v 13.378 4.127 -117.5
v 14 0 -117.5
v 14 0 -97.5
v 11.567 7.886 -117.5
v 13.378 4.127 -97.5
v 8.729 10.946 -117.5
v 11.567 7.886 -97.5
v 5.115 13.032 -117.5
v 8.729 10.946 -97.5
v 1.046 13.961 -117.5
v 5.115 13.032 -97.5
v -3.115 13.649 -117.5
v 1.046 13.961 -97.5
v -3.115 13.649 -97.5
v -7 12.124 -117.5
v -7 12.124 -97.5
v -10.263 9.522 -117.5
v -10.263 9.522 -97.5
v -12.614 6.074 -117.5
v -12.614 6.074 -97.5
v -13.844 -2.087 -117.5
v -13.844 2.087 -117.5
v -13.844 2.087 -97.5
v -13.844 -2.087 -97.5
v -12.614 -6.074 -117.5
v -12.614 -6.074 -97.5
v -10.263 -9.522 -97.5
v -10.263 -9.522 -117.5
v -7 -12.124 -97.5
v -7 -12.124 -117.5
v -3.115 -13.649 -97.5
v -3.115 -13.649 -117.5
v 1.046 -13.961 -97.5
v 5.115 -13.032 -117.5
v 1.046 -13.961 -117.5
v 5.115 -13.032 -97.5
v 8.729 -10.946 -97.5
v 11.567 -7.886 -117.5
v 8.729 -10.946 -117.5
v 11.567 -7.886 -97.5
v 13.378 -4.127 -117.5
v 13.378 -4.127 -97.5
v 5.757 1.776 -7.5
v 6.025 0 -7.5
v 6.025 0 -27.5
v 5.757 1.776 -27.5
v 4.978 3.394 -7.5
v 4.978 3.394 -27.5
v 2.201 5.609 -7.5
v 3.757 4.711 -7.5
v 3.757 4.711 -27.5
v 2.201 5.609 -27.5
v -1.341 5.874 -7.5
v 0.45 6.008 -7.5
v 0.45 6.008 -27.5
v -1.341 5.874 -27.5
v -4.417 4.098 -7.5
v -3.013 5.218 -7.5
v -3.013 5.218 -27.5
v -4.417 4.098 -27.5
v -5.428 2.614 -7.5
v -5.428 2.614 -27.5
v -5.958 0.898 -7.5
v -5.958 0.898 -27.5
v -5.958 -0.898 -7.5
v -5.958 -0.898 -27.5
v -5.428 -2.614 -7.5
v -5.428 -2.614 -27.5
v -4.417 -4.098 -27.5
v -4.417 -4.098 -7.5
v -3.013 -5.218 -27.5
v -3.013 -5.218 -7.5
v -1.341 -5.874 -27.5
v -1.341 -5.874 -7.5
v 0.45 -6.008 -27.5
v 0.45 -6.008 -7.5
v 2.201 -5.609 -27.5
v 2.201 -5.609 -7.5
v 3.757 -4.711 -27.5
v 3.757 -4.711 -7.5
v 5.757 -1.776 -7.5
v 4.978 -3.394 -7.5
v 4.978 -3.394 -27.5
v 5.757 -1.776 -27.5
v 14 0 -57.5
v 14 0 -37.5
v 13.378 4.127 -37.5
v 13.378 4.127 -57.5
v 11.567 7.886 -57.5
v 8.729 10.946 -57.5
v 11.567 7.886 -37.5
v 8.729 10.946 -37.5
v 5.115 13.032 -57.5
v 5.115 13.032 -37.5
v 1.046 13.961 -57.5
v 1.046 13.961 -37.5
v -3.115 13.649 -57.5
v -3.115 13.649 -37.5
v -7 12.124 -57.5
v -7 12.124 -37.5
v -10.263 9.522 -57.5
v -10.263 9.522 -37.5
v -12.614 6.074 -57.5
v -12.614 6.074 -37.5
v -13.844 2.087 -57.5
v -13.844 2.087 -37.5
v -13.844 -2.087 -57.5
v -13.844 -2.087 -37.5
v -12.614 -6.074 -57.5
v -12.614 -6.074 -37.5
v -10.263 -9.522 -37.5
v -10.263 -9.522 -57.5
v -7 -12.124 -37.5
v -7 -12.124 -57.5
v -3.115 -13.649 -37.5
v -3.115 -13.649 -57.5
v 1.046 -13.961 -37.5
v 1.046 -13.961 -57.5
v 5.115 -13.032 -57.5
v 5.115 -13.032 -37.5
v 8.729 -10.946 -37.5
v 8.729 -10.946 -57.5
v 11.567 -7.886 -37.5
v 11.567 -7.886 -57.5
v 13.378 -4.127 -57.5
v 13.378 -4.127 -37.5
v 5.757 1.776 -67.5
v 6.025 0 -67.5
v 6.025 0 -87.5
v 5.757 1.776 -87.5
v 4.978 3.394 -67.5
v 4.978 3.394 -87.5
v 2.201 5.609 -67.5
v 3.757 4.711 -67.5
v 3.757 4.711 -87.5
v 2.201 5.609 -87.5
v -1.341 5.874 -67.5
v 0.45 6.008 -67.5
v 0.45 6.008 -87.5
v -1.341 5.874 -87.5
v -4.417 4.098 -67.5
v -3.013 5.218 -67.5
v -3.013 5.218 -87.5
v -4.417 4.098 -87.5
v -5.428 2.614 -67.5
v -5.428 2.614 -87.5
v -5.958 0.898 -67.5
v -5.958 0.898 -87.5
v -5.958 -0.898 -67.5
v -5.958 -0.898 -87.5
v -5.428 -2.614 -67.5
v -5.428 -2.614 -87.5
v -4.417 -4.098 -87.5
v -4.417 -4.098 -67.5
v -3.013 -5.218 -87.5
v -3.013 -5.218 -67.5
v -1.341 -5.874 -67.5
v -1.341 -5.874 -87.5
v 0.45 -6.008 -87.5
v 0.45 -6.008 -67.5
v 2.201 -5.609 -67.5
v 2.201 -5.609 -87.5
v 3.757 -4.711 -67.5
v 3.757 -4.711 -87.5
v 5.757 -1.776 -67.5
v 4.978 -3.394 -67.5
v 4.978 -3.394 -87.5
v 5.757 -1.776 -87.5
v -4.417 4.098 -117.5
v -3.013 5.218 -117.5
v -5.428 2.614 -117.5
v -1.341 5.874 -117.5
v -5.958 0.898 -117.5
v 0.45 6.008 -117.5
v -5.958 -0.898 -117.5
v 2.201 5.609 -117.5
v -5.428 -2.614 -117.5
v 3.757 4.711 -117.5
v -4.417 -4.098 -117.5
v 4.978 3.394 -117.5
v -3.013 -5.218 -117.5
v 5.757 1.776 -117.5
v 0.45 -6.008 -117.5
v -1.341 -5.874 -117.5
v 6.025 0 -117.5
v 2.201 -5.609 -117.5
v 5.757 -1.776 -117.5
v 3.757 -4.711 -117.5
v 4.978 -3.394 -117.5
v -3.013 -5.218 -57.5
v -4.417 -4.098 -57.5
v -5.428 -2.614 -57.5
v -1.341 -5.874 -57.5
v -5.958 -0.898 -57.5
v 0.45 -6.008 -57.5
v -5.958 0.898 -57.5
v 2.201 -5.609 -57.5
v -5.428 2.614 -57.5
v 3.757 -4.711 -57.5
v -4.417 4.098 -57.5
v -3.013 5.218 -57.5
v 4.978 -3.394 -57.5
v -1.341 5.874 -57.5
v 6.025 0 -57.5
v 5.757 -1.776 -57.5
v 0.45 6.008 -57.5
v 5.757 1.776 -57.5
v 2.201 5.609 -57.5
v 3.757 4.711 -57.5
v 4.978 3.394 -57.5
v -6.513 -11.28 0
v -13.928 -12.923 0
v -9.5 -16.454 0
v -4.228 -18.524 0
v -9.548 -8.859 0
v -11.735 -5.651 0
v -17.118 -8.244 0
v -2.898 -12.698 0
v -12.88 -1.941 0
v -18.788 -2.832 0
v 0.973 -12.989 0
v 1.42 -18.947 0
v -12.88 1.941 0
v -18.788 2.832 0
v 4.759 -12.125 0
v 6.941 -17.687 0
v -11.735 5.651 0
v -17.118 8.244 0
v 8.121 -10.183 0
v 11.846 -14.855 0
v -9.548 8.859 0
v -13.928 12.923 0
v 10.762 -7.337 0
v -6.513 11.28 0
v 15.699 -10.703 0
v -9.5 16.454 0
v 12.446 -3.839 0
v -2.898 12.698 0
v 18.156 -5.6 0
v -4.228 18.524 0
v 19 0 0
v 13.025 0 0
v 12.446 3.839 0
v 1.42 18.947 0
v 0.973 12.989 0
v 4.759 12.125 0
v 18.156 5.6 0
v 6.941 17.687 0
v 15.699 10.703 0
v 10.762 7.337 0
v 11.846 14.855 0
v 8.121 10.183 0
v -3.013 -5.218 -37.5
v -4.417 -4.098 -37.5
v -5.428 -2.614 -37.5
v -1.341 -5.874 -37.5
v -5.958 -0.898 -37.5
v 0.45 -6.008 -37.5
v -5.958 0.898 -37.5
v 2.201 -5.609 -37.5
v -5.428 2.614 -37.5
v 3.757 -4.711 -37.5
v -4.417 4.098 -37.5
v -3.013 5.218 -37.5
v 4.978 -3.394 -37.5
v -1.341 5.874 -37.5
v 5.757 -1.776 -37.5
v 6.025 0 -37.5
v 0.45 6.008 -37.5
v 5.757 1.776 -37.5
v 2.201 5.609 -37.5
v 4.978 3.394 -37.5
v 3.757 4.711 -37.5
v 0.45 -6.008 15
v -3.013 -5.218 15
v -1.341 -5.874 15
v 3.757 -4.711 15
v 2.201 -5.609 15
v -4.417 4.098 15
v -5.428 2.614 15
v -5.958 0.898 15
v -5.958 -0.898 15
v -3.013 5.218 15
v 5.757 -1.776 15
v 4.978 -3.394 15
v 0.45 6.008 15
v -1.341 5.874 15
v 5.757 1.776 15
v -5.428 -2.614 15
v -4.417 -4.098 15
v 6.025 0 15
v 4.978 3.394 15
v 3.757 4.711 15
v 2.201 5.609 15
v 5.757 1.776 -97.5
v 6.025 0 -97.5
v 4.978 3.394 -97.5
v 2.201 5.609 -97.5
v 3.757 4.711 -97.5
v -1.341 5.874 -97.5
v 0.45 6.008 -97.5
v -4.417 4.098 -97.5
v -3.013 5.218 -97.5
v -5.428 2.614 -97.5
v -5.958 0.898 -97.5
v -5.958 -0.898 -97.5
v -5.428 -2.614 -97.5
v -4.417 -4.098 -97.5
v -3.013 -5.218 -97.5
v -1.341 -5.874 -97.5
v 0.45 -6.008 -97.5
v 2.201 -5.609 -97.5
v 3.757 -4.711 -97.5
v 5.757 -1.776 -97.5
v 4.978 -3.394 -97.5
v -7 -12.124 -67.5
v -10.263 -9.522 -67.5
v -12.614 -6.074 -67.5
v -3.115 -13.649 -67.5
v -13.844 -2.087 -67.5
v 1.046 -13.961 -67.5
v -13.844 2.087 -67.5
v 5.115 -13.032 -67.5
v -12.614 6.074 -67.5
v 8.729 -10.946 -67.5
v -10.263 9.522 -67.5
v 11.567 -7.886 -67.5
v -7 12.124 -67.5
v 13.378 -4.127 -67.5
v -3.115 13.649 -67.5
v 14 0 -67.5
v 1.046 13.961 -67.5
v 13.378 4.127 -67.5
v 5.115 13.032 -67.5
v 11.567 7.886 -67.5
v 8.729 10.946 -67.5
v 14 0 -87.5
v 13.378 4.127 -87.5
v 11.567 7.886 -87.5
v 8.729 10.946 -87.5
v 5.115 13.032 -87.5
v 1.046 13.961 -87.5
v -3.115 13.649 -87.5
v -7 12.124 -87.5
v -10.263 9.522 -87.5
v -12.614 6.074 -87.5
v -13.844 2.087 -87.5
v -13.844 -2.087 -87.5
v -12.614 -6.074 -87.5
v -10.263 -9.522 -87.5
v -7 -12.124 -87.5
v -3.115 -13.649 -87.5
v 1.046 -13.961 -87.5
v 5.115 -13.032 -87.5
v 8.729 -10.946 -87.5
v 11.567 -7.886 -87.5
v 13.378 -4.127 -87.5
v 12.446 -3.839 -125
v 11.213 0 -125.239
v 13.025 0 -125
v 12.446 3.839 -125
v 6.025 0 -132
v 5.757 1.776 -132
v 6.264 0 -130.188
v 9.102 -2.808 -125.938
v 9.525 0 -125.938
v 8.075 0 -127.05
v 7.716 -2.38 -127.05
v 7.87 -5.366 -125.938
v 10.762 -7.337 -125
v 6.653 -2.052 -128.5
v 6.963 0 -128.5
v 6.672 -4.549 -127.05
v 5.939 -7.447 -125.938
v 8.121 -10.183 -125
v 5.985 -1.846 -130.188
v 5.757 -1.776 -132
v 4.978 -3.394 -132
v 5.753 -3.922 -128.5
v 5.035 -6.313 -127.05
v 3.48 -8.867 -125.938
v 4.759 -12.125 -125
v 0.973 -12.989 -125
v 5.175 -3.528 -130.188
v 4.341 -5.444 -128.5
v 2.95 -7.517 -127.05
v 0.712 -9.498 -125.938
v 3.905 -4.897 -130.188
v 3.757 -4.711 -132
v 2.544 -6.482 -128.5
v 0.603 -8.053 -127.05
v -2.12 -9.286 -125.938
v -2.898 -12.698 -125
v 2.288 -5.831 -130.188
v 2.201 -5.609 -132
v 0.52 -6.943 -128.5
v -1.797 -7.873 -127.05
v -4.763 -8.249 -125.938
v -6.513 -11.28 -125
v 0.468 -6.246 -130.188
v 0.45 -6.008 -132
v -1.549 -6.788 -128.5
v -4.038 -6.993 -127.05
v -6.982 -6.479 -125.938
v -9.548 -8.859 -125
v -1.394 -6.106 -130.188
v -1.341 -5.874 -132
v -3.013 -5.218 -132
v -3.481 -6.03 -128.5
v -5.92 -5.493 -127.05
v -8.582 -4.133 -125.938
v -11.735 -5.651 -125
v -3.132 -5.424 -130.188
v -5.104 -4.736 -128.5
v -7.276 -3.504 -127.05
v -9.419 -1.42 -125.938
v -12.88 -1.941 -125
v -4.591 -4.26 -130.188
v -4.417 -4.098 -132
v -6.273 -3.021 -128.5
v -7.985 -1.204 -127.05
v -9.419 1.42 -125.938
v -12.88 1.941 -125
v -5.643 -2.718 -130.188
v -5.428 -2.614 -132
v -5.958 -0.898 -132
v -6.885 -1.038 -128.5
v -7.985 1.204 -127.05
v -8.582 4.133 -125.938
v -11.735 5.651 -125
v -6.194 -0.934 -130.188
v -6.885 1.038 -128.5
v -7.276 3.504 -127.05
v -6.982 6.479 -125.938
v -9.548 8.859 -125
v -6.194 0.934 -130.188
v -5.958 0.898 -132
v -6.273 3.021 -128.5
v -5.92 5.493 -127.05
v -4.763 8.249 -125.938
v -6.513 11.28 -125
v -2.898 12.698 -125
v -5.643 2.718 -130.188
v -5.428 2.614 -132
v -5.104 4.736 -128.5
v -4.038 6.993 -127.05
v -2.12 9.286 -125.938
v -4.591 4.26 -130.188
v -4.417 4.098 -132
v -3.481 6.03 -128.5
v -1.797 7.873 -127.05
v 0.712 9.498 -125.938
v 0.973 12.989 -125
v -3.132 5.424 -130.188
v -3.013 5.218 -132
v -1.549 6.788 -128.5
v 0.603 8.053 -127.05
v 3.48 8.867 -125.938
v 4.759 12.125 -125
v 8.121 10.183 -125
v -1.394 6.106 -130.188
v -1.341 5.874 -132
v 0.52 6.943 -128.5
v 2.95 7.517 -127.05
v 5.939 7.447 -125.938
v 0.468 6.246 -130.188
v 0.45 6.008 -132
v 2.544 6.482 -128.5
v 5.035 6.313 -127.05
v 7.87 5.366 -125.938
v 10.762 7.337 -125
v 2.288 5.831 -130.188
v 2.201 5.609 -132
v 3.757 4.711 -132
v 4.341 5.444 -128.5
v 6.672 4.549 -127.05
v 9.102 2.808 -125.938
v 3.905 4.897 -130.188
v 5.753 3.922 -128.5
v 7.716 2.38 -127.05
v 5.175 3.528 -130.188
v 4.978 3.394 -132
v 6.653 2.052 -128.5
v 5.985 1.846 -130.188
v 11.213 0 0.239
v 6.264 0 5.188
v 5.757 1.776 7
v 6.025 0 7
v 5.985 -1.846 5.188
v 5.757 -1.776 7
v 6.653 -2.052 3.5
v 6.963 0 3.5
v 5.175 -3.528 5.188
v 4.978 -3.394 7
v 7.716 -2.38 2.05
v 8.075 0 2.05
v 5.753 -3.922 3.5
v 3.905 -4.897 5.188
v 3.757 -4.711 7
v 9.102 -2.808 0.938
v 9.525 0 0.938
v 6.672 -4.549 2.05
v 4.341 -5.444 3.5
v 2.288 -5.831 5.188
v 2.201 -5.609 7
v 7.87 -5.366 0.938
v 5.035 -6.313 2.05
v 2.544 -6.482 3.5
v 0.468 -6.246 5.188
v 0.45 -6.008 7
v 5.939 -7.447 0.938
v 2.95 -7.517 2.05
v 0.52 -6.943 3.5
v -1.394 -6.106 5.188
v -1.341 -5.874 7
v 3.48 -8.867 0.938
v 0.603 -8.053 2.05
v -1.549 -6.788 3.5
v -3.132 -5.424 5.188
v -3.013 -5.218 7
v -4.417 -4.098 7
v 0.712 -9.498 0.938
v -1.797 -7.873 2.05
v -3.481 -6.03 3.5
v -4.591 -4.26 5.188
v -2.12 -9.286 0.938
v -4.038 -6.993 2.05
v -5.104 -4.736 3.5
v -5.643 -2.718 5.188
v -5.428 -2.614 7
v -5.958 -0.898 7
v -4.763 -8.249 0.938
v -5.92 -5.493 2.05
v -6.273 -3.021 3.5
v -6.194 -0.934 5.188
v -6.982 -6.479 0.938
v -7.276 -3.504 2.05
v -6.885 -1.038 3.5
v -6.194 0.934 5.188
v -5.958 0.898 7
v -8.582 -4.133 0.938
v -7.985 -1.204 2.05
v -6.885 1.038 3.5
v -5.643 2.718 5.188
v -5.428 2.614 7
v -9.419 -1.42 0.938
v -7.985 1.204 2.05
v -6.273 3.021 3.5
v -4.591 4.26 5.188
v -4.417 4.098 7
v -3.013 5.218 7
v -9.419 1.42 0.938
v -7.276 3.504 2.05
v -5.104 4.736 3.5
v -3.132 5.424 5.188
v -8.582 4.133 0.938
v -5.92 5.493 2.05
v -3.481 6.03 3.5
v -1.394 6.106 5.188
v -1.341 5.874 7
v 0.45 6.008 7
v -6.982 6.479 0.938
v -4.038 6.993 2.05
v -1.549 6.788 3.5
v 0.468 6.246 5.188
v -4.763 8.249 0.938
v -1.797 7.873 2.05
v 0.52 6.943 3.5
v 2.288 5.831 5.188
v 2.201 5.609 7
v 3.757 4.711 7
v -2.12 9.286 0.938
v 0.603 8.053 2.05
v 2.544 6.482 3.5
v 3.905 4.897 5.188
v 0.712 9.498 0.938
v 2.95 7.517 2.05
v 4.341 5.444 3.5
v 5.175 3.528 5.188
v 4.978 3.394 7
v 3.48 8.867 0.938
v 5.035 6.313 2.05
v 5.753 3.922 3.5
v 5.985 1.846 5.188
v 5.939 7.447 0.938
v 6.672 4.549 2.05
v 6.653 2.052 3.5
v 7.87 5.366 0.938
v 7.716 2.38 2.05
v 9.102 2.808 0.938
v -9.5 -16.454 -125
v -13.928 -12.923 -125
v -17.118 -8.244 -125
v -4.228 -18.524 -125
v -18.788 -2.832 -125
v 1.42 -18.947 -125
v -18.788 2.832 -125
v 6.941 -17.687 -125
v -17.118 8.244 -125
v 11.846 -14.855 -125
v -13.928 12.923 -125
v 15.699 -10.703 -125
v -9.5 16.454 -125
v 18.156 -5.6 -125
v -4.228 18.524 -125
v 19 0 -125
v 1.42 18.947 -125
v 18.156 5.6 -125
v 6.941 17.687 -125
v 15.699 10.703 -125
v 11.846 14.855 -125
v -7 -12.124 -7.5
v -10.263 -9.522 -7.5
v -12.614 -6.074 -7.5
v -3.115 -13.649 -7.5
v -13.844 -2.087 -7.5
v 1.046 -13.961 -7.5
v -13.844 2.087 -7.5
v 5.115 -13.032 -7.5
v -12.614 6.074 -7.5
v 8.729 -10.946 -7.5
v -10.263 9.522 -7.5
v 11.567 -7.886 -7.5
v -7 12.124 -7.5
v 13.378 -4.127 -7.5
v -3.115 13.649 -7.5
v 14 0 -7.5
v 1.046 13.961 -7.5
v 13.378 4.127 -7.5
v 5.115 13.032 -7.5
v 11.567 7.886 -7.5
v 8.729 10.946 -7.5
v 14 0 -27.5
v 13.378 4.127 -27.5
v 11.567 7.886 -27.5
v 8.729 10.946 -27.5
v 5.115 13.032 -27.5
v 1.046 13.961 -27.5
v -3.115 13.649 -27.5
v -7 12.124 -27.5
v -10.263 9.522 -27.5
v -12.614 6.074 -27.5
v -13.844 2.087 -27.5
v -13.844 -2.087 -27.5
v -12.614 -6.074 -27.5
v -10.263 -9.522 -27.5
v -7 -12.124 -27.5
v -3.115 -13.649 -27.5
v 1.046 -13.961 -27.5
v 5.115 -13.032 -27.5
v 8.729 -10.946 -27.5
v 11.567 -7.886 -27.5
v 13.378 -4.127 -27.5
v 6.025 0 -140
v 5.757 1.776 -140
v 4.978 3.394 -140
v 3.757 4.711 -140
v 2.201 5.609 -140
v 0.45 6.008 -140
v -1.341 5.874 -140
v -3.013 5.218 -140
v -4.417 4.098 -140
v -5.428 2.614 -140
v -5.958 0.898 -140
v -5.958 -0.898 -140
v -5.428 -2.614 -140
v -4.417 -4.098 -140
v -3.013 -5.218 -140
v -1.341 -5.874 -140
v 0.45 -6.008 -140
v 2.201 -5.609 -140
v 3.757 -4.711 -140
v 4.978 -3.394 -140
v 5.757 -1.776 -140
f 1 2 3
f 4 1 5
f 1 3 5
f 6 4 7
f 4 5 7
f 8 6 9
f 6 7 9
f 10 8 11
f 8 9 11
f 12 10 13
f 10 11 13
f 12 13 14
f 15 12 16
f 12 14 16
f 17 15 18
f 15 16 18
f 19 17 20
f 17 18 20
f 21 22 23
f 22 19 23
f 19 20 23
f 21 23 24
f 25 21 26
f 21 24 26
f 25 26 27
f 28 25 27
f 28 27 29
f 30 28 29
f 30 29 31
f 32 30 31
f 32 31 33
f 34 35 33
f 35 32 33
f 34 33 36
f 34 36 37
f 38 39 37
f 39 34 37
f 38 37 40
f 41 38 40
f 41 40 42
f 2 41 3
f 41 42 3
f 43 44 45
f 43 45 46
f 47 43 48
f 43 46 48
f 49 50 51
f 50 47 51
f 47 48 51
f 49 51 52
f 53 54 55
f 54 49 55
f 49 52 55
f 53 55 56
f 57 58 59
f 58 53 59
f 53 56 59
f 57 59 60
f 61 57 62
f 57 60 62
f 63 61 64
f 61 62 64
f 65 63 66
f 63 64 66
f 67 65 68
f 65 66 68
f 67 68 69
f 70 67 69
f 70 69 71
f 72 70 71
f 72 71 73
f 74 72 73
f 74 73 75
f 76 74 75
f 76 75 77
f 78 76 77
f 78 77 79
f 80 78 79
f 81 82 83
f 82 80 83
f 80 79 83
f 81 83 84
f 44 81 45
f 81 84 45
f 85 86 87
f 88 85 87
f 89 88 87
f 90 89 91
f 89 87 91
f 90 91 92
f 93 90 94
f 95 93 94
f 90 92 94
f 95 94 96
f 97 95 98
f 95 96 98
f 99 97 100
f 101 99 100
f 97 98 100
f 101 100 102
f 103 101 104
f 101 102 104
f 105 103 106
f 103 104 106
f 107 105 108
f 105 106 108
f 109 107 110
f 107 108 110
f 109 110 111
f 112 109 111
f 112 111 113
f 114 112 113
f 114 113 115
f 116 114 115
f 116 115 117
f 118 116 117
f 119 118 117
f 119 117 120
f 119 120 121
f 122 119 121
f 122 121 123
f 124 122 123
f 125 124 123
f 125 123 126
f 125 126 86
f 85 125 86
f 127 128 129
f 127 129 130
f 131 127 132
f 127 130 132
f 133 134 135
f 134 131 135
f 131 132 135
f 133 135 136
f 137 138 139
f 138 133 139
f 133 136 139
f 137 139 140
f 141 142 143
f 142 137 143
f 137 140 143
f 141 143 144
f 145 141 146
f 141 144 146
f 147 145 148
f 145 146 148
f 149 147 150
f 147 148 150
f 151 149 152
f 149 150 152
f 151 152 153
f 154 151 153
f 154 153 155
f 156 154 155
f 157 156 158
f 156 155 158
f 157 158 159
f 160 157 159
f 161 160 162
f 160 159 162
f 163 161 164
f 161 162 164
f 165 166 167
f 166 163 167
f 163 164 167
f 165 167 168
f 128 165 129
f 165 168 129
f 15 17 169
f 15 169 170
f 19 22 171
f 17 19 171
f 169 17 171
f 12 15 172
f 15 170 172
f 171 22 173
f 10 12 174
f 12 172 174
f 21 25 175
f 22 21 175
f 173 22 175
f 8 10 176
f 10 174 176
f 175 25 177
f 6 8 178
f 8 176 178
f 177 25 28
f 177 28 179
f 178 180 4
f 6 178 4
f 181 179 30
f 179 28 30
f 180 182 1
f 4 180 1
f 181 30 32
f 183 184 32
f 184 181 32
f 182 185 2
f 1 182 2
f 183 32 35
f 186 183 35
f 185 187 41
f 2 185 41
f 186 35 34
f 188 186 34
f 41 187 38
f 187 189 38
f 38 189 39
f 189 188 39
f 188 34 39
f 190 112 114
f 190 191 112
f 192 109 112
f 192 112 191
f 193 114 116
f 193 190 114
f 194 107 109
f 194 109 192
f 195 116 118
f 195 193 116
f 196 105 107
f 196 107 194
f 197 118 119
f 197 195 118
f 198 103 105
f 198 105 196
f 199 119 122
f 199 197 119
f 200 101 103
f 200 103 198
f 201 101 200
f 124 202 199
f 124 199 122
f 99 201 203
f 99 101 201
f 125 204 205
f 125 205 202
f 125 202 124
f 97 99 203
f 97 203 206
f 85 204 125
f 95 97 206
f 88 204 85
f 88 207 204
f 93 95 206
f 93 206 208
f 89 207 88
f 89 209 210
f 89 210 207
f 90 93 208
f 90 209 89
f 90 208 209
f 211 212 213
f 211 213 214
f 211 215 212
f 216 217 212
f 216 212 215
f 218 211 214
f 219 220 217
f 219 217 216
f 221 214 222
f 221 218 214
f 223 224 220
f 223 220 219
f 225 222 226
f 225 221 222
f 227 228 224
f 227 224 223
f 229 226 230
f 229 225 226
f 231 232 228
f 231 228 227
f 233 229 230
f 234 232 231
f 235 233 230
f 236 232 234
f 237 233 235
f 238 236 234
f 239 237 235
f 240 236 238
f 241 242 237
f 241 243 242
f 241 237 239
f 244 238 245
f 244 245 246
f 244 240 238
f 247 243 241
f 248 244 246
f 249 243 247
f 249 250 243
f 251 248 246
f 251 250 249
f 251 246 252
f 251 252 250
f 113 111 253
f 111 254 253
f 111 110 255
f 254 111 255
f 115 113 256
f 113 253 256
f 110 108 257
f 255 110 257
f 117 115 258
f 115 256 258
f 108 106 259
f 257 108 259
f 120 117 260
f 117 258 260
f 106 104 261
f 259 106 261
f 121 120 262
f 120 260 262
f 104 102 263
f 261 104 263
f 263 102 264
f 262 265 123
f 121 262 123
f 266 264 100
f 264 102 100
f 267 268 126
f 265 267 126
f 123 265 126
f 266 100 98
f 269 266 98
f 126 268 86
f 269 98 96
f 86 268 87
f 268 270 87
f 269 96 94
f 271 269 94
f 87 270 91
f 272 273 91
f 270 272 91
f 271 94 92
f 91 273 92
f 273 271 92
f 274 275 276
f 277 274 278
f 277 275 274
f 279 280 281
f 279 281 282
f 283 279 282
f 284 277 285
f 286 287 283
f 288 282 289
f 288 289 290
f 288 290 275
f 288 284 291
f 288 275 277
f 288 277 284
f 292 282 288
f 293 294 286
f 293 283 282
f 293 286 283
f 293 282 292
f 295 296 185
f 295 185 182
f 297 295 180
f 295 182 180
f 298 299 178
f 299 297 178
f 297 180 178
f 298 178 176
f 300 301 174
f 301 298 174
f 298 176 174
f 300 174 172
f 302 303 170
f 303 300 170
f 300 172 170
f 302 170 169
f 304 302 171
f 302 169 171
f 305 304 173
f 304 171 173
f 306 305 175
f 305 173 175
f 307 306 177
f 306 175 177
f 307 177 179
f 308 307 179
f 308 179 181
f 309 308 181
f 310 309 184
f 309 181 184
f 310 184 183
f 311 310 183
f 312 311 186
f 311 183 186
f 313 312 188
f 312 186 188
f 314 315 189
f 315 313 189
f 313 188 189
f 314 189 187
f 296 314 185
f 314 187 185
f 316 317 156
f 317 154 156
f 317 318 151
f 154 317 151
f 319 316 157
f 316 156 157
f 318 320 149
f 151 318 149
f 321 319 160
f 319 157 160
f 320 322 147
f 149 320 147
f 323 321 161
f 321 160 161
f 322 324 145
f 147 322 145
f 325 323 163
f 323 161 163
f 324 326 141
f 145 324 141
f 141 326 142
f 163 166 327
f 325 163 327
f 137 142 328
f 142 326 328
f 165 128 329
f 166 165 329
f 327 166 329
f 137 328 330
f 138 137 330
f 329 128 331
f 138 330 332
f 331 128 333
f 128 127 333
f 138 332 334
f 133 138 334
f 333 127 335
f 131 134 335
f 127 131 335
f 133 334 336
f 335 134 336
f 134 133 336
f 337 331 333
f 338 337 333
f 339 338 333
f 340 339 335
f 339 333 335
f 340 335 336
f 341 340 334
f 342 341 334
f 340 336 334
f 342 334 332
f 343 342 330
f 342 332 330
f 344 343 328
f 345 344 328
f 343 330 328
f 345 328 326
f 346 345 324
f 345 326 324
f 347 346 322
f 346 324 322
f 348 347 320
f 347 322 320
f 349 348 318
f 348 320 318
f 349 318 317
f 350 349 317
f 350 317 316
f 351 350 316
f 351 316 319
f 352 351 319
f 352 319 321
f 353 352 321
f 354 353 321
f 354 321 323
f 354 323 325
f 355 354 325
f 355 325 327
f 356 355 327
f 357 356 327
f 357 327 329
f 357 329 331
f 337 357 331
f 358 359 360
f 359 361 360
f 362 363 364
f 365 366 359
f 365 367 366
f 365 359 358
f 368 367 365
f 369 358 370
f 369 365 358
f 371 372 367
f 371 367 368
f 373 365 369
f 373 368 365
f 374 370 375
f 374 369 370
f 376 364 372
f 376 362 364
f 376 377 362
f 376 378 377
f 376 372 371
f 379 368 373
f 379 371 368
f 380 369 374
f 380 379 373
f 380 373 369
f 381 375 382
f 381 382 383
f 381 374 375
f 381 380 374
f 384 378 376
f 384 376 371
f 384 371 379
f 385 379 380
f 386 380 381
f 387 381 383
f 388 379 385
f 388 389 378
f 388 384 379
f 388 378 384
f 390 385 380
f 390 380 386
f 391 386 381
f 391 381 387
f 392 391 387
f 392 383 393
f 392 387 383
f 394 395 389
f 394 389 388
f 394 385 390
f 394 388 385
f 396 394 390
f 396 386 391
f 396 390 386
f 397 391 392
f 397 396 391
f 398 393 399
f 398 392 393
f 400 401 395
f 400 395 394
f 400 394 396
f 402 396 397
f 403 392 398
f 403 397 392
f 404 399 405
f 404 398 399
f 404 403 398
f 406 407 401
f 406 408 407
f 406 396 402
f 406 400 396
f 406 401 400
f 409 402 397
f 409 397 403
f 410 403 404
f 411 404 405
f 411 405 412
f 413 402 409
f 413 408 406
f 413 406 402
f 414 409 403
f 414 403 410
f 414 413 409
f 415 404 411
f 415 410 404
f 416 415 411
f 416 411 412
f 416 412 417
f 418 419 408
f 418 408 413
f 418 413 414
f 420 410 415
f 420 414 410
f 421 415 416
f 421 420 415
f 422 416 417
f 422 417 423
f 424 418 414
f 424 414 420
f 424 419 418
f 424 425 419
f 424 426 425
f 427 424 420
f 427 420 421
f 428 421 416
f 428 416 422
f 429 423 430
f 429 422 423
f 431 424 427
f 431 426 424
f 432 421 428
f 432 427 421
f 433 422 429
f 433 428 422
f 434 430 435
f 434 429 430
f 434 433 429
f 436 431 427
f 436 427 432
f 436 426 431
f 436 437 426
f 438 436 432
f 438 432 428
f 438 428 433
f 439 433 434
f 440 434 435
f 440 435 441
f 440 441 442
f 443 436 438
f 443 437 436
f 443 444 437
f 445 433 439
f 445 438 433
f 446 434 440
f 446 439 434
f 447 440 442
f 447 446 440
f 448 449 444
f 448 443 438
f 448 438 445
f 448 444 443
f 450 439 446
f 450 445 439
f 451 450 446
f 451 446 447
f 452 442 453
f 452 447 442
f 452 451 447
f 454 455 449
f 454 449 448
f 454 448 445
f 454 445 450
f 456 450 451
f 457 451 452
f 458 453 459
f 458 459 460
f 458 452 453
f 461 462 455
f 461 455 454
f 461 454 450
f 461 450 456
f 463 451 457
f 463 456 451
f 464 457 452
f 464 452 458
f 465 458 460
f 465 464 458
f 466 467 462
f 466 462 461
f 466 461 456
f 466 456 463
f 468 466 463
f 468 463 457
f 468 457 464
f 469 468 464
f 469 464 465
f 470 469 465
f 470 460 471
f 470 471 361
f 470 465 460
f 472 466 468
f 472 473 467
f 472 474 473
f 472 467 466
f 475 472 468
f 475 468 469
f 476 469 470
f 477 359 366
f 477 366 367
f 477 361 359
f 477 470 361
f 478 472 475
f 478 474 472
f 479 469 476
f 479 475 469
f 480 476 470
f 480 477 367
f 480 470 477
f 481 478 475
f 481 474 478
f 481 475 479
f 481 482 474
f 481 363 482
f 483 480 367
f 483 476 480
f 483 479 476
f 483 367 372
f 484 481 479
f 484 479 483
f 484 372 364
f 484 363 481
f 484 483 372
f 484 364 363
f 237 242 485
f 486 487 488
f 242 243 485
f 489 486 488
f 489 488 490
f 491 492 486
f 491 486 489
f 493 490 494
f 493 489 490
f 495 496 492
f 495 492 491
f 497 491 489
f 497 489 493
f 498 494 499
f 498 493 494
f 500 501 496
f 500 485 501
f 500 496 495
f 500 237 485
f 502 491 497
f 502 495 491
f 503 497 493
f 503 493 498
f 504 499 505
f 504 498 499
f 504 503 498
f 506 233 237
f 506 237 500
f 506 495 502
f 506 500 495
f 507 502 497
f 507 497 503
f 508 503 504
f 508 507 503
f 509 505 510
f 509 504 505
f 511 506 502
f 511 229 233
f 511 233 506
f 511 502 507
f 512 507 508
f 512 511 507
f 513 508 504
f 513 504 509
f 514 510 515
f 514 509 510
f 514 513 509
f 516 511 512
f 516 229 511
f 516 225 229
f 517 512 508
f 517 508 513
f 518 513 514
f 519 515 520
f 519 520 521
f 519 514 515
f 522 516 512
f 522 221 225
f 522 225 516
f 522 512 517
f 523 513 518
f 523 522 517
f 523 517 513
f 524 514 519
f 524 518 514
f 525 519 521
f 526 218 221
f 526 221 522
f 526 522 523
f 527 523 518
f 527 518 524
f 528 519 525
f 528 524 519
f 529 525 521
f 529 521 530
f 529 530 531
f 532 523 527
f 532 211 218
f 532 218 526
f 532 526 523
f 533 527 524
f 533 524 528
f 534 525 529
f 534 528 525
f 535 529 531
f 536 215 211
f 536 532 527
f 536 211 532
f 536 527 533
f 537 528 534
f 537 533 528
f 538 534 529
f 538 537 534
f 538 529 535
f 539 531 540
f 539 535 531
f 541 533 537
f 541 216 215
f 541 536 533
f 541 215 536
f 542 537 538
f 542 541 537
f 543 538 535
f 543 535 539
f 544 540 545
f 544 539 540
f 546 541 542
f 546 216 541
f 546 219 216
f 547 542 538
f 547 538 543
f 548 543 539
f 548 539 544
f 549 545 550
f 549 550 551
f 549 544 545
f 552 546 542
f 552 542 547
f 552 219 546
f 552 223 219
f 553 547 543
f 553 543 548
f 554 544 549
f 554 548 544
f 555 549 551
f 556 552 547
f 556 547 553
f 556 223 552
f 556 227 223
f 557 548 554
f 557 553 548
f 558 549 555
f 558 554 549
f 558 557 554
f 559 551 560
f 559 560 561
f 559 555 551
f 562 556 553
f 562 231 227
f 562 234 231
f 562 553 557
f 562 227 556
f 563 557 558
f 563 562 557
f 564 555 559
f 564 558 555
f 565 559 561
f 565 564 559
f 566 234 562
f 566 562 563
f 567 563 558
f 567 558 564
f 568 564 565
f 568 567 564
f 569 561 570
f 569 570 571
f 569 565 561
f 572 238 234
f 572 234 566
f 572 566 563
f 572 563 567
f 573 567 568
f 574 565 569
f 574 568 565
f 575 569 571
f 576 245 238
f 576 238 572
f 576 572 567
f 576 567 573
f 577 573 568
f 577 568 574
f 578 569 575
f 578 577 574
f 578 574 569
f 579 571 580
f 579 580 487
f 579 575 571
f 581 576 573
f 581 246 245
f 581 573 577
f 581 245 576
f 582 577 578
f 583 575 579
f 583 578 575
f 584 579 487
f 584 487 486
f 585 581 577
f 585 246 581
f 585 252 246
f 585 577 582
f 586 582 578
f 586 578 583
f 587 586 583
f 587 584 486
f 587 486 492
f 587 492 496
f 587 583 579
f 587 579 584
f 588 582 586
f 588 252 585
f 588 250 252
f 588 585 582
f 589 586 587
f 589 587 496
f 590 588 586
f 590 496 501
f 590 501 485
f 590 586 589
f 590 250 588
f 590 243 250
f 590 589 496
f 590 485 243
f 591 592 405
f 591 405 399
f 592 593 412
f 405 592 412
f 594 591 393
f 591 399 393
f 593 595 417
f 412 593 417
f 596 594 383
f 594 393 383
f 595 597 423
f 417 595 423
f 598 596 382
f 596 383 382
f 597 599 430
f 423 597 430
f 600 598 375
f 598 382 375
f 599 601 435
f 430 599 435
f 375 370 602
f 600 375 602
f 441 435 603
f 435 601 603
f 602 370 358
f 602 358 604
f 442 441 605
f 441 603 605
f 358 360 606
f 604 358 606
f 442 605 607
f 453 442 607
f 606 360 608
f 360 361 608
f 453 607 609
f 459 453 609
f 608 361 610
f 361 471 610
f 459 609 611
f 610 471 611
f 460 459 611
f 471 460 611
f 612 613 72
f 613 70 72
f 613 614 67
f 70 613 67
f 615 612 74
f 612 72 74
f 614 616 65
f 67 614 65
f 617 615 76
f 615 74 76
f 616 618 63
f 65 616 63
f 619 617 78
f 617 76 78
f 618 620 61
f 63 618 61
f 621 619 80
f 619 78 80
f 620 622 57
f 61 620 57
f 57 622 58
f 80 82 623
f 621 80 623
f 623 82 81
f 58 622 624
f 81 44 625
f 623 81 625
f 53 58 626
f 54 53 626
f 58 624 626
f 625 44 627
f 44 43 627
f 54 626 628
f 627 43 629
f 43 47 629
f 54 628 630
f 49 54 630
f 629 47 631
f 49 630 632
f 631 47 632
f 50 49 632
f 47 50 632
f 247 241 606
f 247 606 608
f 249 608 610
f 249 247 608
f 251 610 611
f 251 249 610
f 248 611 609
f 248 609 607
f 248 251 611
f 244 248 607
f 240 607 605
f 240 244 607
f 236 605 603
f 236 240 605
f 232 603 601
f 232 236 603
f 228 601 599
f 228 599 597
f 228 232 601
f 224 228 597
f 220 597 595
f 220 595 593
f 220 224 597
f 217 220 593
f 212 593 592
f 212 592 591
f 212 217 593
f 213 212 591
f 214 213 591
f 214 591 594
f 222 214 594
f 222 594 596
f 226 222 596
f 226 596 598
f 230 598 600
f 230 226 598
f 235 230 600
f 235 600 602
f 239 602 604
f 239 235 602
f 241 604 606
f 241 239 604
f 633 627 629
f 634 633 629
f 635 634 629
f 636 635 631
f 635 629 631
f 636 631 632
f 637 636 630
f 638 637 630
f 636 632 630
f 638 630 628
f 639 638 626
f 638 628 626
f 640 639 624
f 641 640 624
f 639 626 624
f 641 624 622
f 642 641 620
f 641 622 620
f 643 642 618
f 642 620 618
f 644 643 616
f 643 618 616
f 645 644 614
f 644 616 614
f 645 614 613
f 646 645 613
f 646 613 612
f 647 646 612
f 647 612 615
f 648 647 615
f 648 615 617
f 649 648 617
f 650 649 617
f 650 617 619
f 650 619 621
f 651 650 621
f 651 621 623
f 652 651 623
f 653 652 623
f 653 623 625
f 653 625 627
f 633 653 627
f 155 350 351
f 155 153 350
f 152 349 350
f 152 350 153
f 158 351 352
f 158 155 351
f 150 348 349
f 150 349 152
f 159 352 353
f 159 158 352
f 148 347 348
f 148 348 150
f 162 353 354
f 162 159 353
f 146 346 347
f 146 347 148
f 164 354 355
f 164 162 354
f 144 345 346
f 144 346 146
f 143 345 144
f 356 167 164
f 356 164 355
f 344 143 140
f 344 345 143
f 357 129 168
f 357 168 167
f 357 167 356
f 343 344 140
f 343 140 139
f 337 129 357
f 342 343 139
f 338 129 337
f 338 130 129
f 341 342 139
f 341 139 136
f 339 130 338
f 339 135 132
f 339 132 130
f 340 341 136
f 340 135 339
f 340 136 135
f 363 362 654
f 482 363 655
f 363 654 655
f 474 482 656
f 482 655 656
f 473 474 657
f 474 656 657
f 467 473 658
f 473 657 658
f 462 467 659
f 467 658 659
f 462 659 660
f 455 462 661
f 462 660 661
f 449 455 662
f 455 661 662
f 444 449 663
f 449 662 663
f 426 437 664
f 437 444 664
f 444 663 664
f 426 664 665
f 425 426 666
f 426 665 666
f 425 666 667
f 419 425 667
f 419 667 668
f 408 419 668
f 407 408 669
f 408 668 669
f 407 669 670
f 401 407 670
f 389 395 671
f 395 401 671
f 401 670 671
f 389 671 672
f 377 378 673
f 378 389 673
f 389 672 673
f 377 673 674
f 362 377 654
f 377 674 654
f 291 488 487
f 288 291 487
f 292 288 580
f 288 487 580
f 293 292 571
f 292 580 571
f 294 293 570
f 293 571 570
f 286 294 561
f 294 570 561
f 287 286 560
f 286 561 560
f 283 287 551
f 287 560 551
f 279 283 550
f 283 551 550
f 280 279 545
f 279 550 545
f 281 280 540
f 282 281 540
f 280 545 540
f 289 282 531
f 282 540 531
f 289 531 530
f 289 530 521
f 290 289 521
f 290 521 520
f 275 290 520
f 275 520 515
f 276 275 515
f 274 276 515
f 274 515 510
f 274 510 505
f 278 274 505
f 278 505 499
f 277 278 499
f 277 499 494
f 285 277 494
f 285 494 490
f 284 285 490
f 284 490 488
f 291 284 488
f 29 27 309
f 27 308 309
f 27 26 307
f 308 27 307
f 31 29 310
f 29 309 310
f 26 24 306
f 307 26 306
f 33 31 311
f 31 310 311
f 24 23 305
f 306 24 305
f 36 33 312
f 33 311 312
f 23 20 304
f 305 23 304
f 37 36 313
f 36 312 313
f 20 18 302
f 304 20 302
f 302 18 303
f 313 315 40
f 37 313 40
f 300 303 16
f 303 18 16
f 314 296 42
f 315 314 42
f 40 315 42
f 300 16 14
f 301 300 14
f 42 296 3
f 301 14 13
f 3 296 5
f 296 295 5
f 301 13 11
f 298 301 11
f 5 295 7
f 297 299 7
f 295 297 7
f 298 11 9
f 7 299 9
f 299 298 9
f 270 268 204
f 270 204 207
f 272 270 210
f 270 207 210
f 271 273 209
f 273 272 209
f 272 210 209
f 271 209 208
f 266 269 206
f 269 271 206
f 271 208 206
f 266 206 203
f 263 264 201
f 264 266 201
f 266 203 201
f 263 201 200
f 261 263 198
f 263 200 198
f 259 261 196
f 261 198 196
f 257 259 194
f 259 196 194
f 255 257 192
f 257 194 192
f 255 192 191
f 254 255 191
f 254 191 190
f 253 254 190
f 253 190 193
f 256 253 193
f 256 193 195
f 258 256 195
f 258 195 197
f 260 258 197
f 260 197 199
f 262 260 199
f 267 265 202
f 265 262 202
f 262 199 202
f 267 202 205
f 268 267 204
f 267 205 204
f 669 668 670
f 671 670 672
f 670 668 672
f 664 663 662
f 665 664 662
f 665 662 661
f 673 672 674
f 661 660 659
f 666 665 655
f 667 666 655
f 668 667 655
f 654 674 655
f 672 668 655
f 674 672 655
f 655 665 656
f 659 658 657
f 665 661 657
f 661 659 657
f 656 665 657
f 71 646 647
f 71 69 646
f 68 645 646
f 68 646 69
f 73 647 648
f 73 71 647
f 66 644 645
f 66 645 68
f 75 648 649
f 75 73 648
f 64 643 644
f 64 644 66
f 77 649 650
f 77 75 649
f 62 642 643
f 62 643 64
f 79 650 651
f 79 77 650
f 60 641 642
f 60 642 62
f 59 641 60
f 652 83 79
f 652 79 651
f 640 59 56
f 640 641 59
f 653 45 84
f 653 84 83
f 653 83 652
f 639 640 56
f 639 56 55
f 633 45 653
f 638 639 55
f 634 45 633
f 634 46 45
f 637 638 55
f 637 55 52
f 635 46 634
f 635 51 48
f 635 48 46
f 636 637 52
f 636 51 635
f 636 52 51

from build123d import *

# Parameters (mm, degrees)
SKETCH1_R                 = 19
SKETCH1_R_2               = 14
BOSS_EXTRUDE1_DEPTH       = 125
BOSS_EXTRUDE2_START       = 7.5
SKETCH2_R                 = 14
BOSS_EXTRUDE2_DEPTH       = 7.5
CUT_EXTRUDE1_DEPTH        = 121.53319045
CUT_EXTRUDE1_DEPTH_BACK   = 121.53319045
SKETCH4_R                 = 6.025
SKETCH5_R                 = 14
BOSS_EXTRUDE3_DEPTH       = 7.5
BOSS_EXTRUDE4_DEPTH       = 15
BOSS_EXTRUDE4_DEPTH_BACK  = 140
SKETCH7_R                 = 6.025
SKETCH8_R                 = 15
BOSS_EXTRUDE5_DEPTH       = 5
LPATTERN2_COUNT           = 2
LPATTERN2_PITCH           = 30
LPATTERN3_COPY_1_SKETCH_R = 15
LPATTERN3_COPY_1_DEPTH    = 5
LPATTERN3_COPY_2_SKETCH_R = 15
LPATTERN3_COPY_2_DEPTH    = 5
FILLET1_R                 = 7


with BuildPart() as part:
    # Sketch1 → Boss-Extrude1 (new body)
    with BuildSketch(Plane.XY):
        Circle(SKETCH1_R)
        Circle(SKETCH1_R_2, mode=Mode.SUBTRACT)
    extrude(amount=-BOSS_EXTRUDE1_DEPTH)

    # Sketch2 → Boss-Extrude2 (add)
    with BuildSketch(Plane.XY.offset(-7.5).offset(BOSS_EXTRUDE2_START)):
        Circle(SKETCH2_R)
    extrude(amount=-BOSS_EXTRUDE2_DEPTH)

    # Sketch4 → Cut-Extrude1 (cut, two sides: drawn at the far end of the back side and taken through both)
    with BuildSketch(Plane.XY.offset(-7.5).offset(-CUT_EXTRUDE1_DEPTH_BACK)):
        Circle(SKETCH4_R)
    extrude(amount=CUT_EXTRUDE1_DEPTH + CUT_EXTRUDE1_DEPTH_BACK, mode=Mode.SUBTRACT)

    # Sketch5 → Boss-Extrude3 (add)
    with BuildSketch(Plane(origin=(0, 0, -117.5), x_dir=(-1, 0, 0), z_dir=(0, 0, -1))):
        with Locations(Location((0, 0, 0), (0, 0, 180))):
            Circle(SKETCH5_R)
    extrude(amount=BOSS_EXTRUDE3_DEPTH)

    # Sketch7 → Boss-Extrude4 (add, two sides: drawn at the far end of the back side and taken through both)
    with BuildSketch(Plane.XY.offset(-BOSS_EXTRUDE4_DEPTH_BACK)):
        Circle(SKETCH7_R)
    extrude(amount=BOSS_EXTRUDE4_DEPTH + BOSS_EXTRUDE4_DEPTH_BACK)

    # Sketch8 → Boss-Extrude5 (add, symmetric)
    with BuildSketch(Plane.XY.offset(-62.5)):
        Circle(SKETCH8_R)
    boss_extrude5 = extrude(amount=BOSS_EXTRUDE5_DEPTH, both=True)

    # LPattern2: Boss-Extrude5 ×2
    with Locations(*[(0, 0, -i * LPATTERN2_PITCH) for i in range(1, LPATTERN2_COUNT)]):
        add(boss_extrude5)

    # LPattern3 copy 1 sketch → LPattern3 copy 1 (add, symmetric)
    with BuildSketch(Plane.XY.offset(-62.5)):
        Circle(LPATTERN3_COPY_1_SKETCH_R)
    extrude(amount=LPATTERN3_COPY_1_DEPTH, both=True)

    # LPattern3 copy 2 sketch → LPattern3 copy 2 (add, symmetric)
    with BuildSketch(Plane.XY.offset(-32.5)):
        Circle(LPATTERN3_COPY_2_SKETCH_R)
    extrude(amount=LPATTERN3_COPY_2_DEPTH, both=True)

    # Fillet1
    fillet1_edges = [part.edges().sort_by_distance(p)[0] for p in [
        (-6.025, 0, 0),
        (-6.025, 0, -125),
    ]]
    fillet(fillet1_edges, radius=FILLET1_R)


solid = part.part
